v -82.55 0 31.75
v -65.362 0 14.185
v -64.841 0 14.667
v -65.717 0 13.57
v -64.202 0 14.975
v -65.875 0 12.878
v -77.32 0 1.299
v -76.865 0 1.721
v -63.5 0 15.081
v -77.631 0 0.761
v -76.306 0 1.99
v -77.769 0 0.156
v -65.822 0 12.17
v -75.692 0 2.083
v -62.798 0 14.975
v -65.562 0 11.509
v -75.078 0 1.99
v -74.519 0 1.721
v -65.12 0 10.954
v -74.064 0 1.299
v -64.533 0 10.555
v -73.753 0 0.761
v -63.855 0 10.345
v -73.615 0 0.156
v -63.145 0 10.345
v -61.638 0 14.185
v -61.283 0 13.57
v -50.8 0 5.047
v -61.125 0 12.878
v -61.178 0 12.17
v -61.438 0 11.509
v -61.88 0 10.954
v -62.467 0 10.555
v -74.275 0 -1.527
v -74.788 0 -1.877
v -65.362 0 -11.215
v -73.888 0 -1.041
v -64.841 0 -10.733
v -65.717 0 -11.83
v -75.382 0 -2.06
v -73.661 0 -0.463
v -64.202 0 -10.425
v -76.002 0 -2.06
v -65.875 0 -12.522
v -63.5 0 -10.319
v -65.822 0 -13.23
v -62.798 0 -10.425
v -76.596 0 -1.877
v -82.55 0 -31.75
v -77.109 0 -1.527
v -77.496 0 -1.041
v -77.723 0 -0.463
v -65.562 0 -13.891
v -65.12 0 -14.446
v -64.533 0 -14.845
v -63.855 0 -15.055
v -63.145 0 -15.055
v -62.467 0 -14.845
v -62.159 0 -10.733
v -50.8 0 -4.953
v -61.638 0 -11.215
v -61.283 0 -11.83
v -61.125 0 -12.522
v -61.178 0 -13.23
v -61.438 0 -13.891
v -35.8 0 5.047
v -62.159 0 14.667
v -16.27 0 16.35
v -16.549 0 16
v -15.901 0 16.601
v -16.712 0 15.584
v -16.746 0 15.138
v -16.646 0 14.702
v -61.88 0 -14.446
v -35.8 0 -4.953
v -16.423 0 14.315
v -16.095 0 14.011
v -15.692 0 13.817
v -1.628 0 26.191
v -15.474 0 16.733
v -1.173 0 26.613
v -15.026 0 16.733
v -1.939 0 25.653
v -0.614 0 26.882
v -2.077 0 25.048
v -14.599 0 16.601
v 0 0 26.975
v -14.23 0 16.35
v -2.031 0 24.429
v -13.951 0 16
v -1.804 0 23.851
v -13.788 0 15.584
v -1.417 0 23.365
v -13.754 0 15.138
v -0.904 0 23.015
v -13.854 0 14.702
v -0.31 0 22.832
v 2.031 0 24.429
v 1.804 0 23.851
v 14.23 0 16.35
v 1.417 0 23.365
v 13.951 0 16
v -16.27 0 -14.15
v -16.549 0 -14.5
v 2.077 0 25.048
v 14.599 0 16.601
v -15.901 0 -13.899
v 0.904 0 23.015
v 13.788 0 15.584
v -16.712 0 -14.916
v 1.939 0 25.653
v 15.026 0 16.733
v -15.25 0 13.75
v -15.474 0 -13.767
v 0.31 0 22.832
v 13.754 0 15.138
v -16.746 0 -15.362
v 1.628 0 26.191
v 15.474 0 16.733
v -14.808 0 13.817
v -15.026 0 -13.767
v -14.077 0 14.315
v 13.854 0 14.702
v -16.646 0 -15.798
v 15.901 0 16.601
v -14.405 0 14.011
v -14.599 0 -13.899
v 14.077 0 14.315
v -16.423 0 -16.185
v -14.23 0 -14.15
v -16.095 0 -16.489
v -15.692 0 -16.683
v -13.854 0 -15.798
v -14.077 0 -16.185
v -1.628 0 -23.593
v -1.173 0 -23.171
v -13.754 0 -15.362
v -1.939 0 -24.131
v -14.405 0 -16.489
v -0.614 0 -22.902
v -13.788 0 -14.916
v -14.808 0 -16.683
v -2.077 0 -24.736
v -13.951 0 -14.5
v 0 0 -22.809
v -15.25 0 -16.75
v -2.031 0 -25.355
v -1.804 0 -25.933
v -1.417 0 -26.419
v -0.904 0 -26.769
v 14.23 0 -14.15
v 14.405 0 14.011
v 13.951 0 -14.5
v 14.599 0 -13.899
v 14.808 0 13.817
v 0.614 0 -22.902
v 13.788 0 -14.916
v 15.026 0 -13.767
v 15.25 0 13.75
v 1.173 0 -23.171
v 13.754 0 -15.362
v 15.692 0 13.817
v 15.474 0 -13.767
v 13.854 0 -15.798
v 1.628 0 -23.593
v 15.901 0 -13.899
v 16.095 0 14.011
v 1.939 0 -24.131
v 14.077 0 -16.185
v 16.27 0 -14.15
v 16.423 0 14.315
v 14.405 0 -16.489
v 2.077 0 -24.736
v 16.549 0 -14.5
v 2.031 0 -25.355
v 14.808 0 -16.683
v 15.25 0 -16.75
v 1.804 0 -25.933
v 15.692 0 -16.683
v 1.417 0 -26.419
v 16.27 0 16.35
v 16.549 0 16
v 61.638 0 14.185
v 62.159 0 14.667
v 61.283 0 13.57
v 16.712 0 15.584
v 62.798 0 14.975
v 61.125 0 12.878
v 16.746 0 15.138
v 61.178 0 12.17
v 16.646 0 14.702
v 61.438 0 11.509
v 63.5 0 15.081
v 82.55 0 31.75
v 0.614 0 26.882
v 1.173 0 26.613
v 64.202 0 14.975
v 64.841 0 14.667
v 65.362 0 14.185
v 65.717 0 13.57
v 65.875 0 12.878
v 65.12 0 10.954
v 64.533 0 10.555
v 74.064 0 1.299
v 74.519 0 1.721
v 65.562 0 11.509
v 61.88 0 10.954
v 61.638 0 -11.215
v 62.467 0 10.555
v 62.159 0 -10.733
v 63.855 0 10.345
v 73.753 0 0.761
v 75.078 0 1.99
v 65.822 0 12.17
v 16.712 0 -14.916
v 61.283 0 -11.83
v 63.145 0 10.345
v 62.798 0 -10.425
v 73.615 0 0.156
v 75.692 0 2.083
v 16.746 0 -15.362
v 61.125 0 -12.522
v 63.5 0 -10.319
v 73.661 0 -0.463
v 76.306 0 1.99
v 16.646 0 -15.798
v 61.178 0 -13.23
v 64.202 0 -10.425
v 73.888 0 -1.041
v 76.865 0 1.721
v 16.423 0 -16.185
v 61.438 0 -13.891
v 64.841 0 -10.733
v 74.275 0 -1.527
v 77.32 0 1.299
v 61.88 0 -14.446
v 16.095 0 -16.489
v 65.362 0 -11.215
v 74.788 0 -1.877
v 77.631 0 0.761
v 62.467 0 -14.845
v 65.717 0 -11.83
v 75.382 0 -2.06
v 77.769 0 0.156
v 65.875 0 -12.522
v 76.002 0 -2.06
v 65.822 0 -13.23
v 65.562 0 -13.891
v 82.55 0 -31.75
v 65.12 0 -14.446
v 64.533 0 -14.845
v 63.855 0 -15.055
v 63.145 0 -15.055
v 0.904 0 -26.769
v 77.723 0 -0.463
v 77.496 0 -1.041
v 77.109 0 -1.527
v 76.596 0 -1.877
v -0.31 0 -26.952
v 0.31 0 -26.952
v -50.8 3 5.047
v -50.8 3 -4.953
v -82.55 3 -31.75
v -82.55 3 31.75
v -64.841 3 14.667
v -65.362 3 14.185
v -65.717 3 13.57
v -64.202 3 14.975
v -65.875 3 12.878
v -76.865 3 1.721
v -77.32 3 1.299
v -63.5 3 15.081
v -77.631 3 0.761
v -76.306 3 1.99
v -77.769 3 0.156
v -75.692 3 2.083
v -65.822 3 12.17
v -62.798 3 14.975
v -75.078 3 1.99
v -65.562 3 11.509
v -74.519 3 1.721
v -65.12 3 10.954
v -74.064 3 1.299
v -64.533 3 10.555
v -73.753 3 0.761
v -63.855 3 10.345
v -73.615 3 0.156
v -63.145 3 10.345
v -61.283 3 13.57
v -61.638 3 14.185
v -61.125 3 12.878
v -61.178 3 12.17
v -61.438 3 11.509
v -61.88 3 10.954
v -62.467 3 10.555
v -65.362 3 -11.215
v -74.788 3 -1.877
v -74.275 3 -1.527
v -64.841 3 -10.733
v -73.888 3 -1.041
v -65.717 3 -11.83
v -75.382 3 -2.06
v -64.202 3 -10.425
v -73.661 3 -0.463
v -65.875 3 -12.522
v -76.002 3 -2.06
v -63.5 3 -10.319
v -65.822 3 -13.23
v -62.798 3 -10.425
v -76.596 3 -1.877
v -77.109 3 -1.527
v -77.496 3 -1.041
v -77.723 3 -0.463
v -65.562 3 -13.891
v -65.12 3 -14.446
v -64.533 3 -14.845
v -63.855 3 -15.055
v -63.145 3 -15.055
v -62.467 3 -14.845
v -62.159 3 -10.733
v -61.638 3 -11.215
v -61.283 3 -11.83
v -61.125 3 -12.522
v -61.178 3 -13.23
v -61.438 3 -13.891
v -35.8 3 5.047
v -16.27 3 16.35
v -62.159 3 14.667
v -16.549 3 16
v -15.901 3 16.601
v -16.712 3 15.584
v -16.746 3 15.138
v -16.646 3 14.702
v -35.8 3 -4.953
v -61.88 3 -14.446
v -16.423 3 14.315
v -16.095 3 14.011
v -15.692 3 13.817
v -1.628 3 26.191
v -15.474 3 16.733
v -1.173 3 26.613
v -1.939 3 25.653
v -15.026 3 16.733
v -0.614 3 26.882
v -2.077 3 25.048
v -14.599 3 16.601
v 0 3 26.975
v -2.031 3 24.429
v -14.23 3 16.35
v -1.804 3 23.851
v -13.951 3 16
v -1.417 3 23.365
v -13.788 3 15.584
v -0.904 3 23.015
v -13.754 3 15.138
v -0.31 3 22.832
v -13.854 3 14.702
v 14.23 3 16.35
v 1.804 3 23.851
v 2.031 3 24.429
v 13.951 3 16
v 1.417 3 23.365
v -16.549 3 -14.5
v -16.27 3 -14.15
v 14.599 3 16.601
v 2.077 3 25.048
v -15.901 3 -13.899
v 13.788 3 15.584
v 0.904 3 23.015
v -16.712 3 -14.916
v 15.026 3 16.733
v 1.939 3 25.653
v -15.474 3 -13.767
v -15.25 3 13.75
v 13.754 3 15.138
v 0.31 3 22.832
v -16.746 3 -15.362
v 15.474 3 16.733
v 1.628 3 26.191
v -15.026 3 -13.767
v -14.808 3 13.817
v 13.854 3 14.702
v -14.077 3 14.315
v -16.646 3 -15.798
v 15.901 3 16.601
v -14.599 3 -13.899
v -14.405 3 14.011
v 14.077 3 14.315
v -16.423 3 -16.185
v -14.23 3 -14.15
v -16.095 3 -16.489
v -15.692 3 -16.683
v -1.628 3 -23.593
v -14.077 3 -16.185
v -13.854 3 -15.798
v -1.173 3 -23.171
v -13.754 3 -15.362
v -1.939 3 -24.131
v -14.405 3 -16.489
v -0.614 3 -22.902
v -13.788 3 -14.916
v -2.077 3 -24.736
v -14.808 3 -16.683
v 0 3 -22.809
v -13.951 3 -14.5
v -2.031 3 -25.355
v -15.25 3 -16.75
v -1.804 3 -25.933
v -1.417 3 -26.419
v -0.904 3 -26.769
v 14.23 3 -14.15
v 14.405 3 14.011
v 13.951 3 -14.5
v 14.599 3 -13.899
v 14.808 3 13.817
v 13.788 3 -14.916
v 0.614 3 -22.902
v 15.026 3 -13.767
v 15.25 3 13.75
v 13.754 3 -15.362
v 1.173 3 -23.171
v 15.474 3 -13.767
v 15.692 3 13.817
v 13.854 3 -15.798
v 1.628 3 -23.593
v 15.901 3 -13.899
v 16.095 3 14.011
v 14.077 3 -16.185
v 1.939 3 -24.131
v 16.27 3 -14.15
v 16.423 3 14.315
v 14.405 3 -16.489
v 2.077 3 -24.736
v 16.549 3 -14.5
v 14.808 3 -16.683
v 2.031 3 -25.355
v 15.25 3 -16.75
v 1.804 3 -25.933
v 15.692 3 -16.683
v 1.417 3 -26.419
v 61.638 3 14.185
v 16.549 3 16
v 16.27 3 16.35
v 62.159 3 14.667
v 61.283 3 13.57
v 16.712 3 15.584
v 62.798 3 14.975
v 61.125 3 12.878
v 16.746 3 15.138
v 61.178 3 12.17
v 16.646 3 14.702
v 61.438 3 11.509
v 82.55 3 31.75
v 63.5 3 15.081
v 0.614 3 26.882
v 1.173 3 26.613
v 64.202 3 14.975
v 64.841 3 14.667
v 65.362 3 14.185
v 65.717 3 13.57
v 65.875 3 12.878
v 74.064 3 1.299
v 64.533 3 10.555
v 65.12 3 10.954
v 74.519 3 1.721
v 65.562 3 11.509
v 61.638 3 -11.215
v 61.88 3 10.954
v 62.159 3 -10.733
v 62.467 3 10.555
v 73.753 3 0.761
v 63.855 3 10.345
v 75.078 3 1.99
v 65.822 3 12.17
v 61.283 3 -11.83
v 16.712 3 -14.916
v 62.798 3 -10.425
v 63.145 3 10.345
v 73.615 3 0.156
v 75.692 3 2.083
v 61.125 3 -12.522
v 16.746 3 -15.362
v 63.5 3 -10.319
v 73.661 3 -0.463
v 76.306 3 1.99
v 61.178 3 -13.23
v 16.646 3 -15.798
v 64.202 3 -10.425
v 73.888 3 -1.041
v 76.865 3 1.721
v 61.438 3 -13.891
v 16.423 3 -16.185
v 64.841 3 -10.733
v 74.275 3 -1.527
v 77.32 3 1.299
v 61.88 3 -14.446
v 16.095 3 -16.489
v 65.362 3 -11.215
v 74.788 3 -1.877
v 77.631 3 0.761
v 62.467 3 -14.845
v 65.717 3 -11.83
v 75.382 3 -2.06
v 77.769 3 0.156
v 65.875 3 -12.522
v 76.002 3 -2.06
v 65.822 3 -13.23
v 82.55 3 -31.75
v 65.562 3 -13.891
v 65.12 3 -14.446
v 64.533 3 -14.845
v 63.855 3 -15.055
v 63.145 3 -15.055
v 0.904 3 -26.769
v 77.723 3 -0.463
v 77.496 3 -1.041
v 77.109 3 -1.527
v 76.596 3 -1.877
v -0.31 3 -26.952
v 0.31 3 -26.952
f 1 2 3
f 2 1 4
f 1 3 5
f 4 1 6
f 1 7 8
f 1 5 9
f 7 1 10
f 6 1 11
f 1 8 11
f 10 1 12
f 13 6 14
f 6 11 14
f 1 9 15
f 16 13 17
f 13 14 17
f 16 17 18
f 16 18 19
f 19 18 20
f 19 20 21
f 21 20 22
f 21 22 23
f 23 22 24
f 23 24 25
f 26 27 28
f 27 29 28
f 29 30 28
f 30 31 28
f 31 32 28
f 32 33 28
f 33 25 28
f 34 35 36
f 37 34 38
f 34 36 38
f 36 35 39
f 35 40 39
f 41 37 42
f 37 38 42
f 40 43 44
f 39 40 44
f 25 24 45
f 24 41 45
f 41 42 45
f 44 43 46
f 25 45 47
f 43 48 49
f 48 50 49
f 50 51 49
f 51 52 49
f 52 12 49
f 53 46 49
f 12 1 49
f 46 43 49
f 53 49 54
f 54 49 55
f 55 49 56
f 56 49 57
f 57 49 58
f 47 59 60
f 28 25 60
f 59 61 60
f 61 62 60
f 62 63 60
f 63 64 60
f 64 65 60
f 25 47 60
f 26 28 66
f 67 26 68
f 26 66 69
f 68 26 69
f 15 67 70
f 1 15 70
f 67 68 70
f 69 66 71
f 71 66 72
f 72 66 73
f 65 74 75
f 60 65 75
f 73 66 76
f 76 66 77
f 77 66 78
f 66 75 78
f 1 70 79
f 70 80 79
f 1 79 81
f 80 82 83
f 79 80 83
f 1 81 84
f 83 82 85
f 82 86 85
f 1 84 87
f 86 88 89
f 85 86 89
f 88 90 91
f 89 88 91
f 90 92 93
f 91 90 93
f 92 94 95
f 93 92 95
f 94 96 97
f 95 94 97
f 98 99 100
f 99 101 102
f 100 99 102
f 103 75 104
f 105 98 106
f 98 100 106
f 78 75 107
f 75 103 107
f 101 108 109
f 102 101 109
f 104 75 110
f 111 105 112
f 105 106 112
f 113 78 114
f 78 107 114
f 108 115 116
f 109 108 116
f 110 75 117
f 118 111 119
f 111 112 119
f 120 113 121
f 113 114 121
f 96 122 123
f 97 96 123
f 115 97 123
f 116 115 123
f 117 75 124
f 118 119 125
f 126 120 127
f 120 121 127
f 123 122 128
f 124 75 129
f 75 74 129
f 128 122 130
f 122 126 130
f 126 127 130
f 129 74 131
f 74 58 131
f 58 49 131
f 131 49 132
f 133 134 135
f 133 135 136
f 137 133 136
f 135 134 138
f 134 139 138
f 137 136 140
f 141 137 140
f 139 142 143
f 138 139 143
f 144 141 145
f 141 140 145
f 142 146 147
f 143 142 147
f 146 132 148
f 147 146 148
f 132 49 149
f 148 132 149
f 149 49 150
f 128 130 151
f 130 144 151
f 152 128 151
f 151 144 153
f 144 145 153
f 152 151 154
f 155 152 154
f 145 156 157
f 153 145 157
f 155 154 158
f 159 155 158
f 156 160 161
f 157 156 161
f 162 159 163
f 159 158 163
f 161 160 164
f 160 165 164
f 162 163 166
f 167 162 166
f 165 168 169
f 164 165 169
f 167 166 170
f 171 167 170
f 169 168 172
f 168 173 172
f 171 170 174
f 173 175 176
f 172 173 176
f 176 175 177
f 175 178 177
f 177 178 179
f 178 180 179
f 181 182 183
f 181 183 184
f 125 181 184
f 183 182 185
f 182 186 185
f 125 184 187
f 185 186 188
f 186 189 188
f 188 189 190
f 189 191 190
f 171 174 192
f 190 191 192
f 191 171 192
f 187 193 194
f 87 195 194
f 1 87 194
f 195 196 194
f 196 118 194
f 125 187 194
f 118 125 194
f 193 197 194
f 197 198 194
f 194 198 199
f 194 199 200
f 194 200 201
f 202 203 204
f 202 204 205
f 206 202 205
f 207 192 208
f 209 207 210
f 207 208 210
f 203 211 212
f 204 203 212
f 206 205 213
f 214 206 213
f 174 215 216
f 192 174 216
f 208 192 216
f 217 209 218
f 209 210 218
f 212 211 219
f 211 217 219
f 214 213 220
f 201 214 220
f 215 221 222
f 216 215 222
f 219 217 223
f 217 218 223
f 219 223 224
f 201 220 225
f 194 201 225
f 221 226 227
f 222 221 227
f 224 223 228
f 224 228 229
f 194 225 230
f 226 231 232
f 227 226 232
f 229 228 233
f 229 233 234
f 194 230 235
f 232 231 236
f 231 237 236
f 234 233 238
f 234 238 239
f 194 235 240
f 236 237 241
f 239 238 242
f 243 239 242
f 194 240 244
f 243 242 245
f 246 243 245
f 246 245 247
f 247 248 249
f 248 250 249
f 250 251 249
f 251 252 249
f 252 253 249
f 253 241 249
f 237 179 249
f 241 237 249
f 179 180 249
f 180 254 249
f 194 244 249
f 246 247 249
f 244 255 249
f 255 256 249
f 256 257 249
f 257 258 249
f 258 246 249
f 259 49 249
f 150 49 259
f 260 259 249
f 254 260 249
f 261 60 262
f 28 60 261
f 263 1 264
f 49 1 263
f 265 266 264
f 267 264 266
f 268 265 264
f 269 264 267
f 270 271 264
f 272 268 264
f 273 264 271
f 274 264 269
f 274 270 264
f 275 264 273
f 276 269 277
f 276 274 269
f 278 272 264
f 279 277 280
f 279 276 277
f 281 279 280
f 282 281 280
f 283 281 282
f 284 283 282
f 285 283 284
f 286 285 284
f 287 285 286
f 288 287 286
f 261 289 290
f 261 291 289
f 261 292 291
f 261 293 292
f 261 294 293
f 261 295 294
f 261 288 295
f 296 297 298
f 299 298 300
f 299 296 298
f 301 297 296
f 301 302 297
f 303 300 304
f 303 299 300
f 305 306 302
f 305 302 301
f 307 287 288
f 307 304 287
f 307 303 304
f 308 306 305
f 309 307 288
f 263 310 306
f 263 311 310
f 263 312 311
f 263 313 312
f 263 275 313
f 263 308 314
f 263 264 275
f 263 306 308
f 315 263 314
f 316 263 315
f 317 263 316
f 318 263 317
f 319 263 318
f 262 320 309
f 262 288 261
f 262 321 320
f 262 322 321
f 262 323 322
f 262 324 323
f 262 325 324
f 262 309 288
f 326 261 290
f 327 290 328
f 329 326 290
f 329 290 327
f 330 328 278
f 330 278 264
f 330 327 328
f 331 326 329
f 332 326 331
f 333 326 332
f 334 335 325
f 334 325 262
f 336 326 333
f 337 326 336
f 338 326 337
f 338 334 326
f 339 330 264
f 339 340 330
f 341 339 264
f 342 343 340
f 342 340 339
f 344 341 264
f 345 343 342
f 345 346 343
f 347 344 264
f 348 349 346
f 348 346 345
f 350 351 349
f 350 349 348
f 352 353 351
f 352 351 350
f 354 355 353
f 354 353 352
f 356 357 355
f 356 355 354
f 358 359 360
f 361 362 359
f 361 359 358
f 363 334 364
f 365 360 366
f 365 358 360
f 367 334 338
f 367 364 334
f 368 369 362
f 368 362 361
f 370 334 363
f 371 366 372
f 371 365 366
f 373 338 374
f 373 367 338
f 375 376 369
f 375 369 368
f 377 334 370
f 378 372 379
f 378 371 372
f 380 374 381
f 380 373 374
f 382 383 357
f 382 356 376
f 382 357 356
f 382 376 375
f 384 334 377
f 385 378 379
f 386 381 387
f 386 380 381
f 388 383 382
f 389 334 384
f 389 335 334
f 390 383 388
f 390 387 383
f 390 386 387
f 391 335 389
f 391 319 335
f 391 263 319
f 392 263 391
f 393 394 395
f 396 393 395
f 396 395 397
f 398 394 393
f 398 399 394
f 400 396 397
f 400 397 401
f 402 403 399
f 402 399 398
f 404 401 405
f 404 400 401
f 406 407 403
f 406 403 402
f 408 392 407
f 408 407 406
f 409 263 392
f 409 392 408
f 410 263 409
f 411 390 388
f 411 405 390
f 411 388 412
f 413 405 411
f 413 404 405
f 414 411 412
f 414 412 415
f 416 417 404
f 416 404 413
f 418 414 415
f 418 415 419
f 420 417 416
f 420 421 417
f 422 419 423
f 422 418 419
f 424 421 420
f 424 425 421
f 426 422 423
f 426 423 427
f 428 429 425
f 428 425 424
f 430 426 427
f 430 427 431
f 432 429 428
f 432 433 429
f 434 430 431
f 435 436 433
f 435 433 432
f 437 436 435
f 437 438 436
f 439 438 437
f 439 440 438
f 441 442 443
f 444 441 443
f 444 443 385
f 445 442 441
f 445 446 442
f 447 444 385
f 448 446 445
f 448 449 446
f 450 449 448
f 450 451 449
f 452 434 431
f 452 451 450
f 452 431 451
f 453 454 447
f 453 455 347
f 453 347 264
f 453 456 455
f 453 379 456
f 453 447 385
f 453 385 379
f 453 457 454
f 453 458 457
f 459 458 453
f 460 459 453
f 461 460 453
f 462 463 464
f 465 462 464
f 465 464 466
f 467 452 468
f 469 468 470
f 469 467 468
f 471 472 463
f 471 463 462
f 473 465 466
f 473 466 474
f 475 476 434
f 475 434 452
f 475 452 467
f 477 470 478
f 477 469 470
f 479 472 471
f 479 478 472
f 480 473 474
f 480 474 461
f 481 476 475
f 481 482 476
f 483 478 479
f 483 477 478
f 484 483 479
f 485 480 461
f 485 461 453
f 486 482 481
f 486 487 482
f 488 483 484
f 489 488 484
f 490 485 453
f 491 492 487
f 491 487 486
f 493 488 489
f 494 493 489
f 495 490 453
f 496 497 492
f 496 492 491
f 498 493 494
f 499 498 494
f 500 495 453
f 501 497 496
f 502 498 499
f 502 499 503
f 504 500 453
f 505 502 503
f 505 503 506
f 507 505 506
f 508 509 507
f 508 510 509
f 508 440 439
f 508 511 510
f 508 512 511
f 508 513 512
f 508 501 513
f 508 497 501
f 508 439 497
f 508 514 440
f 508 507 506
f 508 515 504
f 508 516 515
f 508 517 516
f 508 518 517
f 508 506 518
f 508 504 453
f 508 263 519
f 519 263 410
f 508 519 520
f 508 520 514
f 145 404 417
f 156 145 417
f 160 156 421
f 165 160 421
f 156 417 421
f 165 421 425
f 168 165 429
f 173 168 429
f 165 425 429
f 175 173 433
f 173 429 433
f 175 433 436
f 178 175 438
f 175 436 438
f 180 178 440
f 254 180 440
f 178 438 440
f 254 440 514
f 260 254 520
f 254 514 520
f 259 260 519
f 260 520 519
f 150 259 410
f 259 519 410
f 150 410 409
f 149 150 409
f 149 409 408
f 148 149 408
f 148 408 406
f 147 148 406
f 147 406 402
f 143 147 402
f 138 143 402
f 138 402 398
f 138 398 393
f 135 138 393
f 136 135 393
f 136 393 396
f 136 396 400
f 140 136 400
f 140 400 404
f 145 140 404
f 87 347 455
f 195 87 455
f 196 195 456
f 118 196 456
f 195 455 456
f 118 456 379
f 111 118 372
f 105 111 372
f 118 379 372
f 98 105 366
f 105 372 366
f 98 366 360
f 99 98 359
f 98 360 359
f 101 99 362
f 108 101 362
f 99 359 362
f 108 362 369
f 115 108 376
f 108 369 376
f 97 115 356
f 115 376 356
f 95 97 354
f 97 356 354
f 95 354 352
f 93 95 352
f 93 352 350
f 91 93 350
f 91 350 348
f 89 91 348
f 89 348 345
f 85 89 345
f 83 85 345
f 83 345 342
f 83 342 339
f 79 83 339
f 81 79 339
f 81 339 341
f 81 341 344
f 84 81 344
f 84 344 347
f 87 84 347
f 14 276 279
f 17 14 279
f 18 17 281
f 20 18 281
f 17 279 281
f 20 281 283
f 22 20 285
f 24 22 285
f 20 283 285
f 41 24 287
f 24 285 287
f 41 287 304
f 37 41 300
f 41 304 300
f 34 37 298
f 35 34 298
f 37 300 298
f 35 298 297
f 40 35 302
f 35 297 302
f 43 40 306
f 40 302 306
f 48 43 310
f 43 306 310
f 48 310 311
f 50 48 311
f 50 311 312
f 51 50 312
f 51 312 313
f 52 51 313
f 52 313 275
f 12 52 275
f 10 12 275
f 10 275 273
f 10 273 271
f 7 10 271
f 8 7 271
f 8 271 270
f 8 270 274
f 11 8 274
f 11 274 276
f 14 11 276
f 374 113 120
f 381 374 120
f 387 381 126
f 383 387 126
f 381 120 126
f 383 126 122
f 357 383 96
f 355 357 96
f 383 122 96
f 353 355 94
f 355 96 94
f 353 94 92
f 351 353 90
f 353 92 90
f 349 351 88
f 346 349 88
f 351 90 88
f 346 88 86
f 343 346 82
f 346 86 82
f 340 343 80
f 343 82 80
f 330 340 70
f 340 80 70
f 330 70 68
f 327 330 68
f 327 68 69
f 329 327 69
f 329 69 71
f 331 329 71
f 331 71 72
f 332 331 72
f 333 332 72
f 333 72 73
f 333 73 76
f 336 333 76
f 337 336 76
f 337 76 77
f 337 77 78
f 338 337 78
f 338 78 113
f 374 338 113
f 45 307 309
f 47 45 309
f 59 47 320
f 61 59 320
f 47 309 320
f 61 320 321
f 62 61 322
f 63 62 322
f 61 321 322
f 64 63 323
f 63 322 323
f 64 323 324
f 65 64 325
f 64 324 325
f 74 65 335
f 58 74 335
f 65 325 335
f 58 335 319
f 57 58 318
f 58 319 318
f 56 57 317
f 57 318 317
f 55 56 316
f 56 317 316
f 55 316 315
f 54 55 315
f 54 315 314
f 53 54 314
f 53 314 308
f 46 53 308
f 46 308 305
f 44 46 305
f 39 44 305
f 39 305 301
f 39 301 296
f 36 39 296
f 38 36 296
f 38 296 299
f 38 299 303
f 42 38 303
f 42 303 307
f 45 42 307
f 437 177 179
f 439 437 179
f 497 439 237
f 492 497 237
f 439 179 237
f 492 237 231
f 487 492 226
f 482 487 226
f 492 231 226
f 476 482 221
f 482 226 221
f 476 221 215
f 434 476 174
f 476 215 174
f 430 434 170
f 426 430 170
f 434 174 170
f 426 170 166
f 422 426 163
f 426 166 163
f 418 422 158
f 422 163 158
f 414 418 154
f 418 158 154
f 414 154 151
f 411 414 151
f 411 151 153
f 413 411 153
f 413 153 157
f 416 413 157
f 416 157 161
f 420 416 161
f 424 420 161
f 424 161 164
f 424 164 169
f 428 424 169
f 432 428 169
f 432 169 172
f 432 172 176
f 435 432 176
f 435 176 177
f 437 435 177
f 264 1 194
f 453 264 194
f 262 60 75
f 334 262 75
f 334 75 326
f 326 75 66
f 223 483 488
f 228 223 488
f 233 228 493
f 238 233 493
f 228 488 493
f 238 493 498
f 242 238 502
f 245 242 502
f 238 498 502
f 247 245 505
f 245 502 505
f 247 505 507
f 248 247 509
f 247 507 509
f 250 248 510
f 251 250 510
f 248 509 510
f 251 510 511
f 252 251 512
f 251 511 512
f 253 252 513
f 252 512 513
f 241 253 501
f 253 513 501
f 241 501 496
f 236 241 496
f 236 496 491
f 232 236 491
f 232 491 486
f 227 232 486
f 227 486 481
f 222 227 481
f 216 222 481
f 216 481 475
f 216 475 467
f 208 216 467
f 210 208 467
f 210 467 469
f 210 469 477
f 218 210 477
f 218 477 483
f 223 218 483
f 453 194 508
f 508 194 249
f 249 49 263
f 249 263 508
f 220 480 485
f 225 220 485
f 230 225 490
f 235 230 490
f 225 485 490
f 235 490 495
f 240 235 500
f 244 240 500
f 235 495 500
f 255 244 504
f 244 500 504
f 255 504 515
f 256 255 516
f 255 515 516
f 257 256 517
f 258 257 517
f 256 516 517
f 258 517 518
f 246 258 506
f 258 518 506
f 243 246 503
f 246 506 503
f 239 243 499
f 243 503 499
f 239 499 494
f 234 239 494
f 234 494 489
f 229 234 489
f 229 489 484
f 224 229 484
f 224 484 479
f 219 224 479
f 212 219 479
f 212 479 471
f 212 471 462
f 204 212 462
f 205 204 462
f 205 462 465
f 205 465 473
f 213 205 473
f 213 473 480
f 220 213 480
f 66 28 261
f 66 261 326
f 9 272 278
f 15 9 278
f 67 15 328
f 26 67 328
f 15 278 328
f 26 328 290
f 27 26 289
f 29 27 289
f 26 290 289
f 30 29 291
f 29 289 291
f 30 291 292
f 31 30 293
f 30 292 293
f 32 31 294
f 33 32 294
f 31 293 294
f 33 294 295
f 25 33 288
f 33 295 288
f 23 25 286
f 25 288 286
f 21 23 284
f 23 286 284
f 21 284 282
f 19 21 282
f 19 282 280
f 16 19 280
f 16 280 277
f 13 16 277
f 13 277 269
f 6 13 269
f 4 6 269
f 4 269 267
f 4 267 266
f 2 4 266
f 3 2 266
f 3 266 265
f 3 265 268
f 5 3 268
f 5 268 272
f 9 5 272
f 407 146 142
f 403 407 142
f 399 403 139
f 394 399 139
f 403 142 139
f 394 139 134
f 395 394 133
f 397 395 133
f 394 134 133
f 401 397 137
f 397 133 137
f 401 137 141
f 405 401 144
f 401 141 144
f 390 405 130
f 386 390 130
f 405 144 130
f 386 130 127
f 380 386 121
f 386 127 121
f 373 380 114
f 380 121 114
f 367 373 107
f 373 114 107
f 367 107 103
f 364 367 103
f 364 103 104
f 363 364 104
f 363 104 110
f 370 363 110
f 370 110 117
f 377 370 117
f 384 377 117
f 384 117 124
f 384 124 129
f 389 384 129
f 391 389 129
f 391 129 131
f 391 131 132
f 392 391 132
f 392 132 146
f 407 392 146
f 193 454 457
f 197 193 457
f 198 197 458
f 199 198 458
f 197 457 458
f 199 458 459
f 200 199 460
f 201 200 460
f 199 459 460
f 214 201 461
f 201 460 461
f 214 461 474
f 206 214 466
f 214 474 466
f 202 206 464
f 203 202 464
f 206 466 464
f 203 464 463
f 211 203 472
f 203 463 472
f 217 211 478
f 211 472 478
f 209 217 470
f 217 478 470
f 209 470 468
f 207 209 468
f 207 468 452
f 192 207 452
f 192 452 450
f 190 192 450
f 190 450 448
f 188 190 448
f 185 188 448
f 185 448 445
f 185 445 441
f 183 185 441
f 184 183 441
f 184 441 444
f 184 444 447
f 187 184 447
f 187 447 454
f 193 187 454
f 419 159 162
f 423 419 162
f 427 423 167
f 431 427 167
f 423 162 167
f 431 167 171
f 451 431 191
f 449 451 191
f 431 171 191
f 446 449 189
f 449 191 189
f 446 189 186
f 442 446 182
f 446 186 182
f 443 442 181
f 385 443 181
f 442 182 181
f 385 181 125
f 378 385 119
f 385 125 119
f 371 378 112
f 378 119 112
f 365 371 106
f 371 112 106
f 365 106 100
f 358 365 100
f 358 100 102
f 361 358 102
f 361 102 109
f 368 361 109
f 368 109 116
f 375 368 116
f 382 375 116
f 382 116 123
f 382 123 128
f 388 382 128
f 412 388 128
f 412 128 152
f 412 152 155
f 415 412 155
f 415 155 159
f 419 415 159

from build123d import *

# Parameters (mm, degrees)
SKETCH1_W           = 165.1
SKETCH1_H           = 63.5
BOSS_EXTRUDE1_DEPTH = 3
CUT_EXTRUDE1_REACH  = 90.496
SKETCH6_R           = 1.5
SKETCH6_W           = 15
SKETCH6_H           = 10
CUT_EXTRUDE3_REACH  = 90.496
SKETCH8_R           = 2.38125
SKETCH9_R           = 2.0828
CUT_EXTRUDE5_DEPTH  = 5.08
SKETCH10_R          = 2.0828
CUT_EXTRUDE6_DEPTH  = 5.08


with BuildPart() as part:
    # Sketch1 → Boss-Extrude1 (new body)
    with BuildSketch(Plane(origin=(0, 0, 0), x_dir=(1, 0, 0), z_dir=(0, 1, 0))):
        Rectangle(SKETCH1_W, SKETCH1_H)
    extrude(amount=BOSS_EXTRUDE1_DEPTH)

    # Sketch6 → Cut-Extrude1 (cut, up to next)
    with BuildSketch(Plane.XZ, mode=Mode.PRIVATE) as cut_extrude1_sk1:
        with Locations(Location((-15.25, 15.25, 0), (0, 0, 270))):
            Circle(SKETCH6_R)
    cut_extrude1_tool1 = extrude(cut_extrude1_sk1.sketch, amount=-CUT_EXTRUDE1_REACH, mode=Mode.PRIVATE) & part.part
    # Sketch6 → Cut-Extrude1 (cut, up to next)
    with BuildSketch(Plane.XZ, mode=Mode.PRIVATE) as cut_extrude1_sk2:
        with Locations(Location((15.25, 15.25, 0), (0, 0, 270))):
            Circle(SKETCH6_R)
    cut_extrude1_tool2 = extrude(cut_extrude1_sk2.sketch, amount=-CUT_EXTRUDE1_REACH, mode=Mode.PRIVATE) & part.part
    # Sketch6 → Cut-Extrude1 (cut, up to next)
    with BuildSketch(Plane.XZ, mode=Mode.PRIVATE) as cut_extrude1_sk3:
        with Locations(Location((-15.25, -15.25, 0), (0, 0, 270))):
            Circle(SKETCH6_R)
    cut_extrude1_tool3 = extrude(cut_extrude1_sk3.sketch, amount=-CUT_EXTRUDE1_REACH, mode=Mode.PRIVATE) & part.part
    # Sketch6 → Cut-Extrude1 (cut, up to next)
    with BuildSketch(Plane.XZ, mode=Mode.PRIVATE) as cut_extrude1_sk4:
        with Locations(Location((15.25, -15.25, 0), (0, 0, 270))):
            Circle(SKETCH6_R)
    cut_extrude1_tool4 = extrude(cut_extrude1_sk4.sketch, amount=-CUT_EXTRUDE1_REACH, mode=Mode.PRIVATE) & part.part
    # Sketch6 → Cut-Extrude1 (cut, up to next)
    with BuildSketch(Plane.XZ, mode=Mode.PRIVATE) as cut_extrude1_sk5:
        with Locations((-43.3, 0.047)):
            Rectangle(SKETCH6_W, SKETCH6_H)
    cut_extrude1_tool5 = extrude(cut_extrude1_sk5.sketch, amount=-CUT_EXTRUDE1_REACH, mode=Mode.PRIVATE) & part.part
    add(cut_extrude1_tool1.solids().sort_by_distance((-15.25, 0, 15.25))[0], mode=Mode.SUBTRACT)
    add(cut_extrude1_tool2.solids().sort_by_distance((15.25, 0, 15.25))[0], mode=Mode.SUBTRACT)
    add(cut_extrude1_tool3.solids().sort_by_distance((-15.25, 0, -15.25))[0], mode=Mode.SUBTRACT)
    add(cut_extrude1_tool4.solids().sort_by_distance((15.25, 0, -15.25))[0], mode=Mode.SUBTRACT)
    add(cut_extrude1_tool5.solids().sort_by_distance((-43.3, 0, 0.047))[0], mode=Mode.SUBTRACT)

    # Sketch8 → Cut-Extrude3 (cut, up to next)
    with BuildSketch(Plane(origin=(0, 3, 0), x_dir=(1, 0, 0), z_dir=(0, 1, 0)), mode=Mode.PRIVATE) as cut_extrude3_sk1:
        with Locations(Location((-63.5, -12.7, 0), (0, 0, 270))):
            Circle(SKETCH8_R)
    cut_extrude3_tool1 = extrude(cut_extrude3_sk1.sketch, amount=-CUT_EXTRUDE3_REACH, mode=Mode.PRIVATE) & part.part
    # Sketch8 → Cut-Extrude3 (cut, up to next)
    with BuildSketch(Plane(origin=(0, 3, 0), x_dir=(1, 0, 0), z_dir=(0, 1, 0)), mode=Mode.PRIVATE) as cut_extrude3_sk2:
        with Locations(Location((-63.5, 12.7, 0), (0, 0, 270))):
            Circle(SKETCH8_R)
    cut_extrude3_tool2 = extrude(cut_extrude3_sk2.sketch, amount=-CUT_EXTRUDE3_REACH, mode=Mode.PRIVATE) & part.part
    # Sketch8 → Cut-Extrude3 (cut, up to next)
    with BuildSketch(Plane(origin=(0, 3, 0), x_dir=(1, 0, 0), z_dir=(0, 1, 0)), mode=Mode.PRIVATE) as cut_extrude3_sk3:
        with Locations(Location((63.5, 12.7, 0), (0, 0, 270))):
            Circle(SKETCH8_R)
    cut_extrude3_tool3 = extrude(cut_extrude3_sk3.sketch, amount=-CUT_EXTRUDE3_REACH, mode=Mode.PRIVATE) & part.part
    # Sketch8 → Cut-Extrude3 (cut, up to next)
    with BuildSketch(Plane(origin=(0, 3, 0), x_dir=(1, 0, 0), z_dir=(0, 1, 0)), mode=Mode.PRIVATE) as cut_extrude3_sk4:
        with Locations(Location((63.5, -12.7, 0), (0, 0, 270))):
            Circle(SKETCH8_R)
    cut_extrude3_tool4 = extrude(cut_extrude3_sk4.sketch, amount=-CUT_EXTRUDE3_REACH, mode=Mode.PRIVATE) & part.part
    add(cut_extrude3_tool1.solids().sort_by_distance((-63.5, 3, 12.7))[0], mode=Mode.SUBTRACT)
    add(cut_extrude3_tool2.solids().sort_by_distance((-63.5, 3, -12.7))[0], mode=Mode.SUBTRACT)
    add(cut_extrude3_tool3.solids().sort_by_distance((63.5, 3, -12.7))[0], mode=Mode.SUBTRACT)
    add(cut_extrude3_tool4.solids().sort_by_distance((63.5, 3, 12.7))[0], mode=Mode.SUBTRACT)

    # Sketch9 → Cut-Extrude5 (cut)
    with BuildSketch(Plane(origin=(0, 3, 0), x_dir=(1, 0, 0), z_dir=(0, 1, 0))):
        with Locations(Location((-75.692, 0, 0), (0, 0, 270))):
            Circle(SKETCH9_R)
        with Locations(Location((75.692, 0, 0), (0, 0, 270))):
            Circle(SKETCH9_R)
    extrude(amount=-CUT_EXTRUDE5_DEPTH, mode=Mode.SUBTRACT)

    # Sketch10 → Cut-Extrude6 (cut)
    with BuildSketch(Plane(origin=(0, 3, 0), x_dir=(1, 0, 0), z_dir=(0, 1, 0))):
        with Locations(Location((0, -24.892, 0), (0, 0, 270))):
            Circle(SKETCH10_R)
        with Locations(Location((0, 24.892, 0), (0, 0, 270))):
            Circle(SKETCH10_R)
    extrude(amount=-CUT_EXTRUDE6_DEPTH, mode=Mode.SUBTRACT)


solid = part.part
